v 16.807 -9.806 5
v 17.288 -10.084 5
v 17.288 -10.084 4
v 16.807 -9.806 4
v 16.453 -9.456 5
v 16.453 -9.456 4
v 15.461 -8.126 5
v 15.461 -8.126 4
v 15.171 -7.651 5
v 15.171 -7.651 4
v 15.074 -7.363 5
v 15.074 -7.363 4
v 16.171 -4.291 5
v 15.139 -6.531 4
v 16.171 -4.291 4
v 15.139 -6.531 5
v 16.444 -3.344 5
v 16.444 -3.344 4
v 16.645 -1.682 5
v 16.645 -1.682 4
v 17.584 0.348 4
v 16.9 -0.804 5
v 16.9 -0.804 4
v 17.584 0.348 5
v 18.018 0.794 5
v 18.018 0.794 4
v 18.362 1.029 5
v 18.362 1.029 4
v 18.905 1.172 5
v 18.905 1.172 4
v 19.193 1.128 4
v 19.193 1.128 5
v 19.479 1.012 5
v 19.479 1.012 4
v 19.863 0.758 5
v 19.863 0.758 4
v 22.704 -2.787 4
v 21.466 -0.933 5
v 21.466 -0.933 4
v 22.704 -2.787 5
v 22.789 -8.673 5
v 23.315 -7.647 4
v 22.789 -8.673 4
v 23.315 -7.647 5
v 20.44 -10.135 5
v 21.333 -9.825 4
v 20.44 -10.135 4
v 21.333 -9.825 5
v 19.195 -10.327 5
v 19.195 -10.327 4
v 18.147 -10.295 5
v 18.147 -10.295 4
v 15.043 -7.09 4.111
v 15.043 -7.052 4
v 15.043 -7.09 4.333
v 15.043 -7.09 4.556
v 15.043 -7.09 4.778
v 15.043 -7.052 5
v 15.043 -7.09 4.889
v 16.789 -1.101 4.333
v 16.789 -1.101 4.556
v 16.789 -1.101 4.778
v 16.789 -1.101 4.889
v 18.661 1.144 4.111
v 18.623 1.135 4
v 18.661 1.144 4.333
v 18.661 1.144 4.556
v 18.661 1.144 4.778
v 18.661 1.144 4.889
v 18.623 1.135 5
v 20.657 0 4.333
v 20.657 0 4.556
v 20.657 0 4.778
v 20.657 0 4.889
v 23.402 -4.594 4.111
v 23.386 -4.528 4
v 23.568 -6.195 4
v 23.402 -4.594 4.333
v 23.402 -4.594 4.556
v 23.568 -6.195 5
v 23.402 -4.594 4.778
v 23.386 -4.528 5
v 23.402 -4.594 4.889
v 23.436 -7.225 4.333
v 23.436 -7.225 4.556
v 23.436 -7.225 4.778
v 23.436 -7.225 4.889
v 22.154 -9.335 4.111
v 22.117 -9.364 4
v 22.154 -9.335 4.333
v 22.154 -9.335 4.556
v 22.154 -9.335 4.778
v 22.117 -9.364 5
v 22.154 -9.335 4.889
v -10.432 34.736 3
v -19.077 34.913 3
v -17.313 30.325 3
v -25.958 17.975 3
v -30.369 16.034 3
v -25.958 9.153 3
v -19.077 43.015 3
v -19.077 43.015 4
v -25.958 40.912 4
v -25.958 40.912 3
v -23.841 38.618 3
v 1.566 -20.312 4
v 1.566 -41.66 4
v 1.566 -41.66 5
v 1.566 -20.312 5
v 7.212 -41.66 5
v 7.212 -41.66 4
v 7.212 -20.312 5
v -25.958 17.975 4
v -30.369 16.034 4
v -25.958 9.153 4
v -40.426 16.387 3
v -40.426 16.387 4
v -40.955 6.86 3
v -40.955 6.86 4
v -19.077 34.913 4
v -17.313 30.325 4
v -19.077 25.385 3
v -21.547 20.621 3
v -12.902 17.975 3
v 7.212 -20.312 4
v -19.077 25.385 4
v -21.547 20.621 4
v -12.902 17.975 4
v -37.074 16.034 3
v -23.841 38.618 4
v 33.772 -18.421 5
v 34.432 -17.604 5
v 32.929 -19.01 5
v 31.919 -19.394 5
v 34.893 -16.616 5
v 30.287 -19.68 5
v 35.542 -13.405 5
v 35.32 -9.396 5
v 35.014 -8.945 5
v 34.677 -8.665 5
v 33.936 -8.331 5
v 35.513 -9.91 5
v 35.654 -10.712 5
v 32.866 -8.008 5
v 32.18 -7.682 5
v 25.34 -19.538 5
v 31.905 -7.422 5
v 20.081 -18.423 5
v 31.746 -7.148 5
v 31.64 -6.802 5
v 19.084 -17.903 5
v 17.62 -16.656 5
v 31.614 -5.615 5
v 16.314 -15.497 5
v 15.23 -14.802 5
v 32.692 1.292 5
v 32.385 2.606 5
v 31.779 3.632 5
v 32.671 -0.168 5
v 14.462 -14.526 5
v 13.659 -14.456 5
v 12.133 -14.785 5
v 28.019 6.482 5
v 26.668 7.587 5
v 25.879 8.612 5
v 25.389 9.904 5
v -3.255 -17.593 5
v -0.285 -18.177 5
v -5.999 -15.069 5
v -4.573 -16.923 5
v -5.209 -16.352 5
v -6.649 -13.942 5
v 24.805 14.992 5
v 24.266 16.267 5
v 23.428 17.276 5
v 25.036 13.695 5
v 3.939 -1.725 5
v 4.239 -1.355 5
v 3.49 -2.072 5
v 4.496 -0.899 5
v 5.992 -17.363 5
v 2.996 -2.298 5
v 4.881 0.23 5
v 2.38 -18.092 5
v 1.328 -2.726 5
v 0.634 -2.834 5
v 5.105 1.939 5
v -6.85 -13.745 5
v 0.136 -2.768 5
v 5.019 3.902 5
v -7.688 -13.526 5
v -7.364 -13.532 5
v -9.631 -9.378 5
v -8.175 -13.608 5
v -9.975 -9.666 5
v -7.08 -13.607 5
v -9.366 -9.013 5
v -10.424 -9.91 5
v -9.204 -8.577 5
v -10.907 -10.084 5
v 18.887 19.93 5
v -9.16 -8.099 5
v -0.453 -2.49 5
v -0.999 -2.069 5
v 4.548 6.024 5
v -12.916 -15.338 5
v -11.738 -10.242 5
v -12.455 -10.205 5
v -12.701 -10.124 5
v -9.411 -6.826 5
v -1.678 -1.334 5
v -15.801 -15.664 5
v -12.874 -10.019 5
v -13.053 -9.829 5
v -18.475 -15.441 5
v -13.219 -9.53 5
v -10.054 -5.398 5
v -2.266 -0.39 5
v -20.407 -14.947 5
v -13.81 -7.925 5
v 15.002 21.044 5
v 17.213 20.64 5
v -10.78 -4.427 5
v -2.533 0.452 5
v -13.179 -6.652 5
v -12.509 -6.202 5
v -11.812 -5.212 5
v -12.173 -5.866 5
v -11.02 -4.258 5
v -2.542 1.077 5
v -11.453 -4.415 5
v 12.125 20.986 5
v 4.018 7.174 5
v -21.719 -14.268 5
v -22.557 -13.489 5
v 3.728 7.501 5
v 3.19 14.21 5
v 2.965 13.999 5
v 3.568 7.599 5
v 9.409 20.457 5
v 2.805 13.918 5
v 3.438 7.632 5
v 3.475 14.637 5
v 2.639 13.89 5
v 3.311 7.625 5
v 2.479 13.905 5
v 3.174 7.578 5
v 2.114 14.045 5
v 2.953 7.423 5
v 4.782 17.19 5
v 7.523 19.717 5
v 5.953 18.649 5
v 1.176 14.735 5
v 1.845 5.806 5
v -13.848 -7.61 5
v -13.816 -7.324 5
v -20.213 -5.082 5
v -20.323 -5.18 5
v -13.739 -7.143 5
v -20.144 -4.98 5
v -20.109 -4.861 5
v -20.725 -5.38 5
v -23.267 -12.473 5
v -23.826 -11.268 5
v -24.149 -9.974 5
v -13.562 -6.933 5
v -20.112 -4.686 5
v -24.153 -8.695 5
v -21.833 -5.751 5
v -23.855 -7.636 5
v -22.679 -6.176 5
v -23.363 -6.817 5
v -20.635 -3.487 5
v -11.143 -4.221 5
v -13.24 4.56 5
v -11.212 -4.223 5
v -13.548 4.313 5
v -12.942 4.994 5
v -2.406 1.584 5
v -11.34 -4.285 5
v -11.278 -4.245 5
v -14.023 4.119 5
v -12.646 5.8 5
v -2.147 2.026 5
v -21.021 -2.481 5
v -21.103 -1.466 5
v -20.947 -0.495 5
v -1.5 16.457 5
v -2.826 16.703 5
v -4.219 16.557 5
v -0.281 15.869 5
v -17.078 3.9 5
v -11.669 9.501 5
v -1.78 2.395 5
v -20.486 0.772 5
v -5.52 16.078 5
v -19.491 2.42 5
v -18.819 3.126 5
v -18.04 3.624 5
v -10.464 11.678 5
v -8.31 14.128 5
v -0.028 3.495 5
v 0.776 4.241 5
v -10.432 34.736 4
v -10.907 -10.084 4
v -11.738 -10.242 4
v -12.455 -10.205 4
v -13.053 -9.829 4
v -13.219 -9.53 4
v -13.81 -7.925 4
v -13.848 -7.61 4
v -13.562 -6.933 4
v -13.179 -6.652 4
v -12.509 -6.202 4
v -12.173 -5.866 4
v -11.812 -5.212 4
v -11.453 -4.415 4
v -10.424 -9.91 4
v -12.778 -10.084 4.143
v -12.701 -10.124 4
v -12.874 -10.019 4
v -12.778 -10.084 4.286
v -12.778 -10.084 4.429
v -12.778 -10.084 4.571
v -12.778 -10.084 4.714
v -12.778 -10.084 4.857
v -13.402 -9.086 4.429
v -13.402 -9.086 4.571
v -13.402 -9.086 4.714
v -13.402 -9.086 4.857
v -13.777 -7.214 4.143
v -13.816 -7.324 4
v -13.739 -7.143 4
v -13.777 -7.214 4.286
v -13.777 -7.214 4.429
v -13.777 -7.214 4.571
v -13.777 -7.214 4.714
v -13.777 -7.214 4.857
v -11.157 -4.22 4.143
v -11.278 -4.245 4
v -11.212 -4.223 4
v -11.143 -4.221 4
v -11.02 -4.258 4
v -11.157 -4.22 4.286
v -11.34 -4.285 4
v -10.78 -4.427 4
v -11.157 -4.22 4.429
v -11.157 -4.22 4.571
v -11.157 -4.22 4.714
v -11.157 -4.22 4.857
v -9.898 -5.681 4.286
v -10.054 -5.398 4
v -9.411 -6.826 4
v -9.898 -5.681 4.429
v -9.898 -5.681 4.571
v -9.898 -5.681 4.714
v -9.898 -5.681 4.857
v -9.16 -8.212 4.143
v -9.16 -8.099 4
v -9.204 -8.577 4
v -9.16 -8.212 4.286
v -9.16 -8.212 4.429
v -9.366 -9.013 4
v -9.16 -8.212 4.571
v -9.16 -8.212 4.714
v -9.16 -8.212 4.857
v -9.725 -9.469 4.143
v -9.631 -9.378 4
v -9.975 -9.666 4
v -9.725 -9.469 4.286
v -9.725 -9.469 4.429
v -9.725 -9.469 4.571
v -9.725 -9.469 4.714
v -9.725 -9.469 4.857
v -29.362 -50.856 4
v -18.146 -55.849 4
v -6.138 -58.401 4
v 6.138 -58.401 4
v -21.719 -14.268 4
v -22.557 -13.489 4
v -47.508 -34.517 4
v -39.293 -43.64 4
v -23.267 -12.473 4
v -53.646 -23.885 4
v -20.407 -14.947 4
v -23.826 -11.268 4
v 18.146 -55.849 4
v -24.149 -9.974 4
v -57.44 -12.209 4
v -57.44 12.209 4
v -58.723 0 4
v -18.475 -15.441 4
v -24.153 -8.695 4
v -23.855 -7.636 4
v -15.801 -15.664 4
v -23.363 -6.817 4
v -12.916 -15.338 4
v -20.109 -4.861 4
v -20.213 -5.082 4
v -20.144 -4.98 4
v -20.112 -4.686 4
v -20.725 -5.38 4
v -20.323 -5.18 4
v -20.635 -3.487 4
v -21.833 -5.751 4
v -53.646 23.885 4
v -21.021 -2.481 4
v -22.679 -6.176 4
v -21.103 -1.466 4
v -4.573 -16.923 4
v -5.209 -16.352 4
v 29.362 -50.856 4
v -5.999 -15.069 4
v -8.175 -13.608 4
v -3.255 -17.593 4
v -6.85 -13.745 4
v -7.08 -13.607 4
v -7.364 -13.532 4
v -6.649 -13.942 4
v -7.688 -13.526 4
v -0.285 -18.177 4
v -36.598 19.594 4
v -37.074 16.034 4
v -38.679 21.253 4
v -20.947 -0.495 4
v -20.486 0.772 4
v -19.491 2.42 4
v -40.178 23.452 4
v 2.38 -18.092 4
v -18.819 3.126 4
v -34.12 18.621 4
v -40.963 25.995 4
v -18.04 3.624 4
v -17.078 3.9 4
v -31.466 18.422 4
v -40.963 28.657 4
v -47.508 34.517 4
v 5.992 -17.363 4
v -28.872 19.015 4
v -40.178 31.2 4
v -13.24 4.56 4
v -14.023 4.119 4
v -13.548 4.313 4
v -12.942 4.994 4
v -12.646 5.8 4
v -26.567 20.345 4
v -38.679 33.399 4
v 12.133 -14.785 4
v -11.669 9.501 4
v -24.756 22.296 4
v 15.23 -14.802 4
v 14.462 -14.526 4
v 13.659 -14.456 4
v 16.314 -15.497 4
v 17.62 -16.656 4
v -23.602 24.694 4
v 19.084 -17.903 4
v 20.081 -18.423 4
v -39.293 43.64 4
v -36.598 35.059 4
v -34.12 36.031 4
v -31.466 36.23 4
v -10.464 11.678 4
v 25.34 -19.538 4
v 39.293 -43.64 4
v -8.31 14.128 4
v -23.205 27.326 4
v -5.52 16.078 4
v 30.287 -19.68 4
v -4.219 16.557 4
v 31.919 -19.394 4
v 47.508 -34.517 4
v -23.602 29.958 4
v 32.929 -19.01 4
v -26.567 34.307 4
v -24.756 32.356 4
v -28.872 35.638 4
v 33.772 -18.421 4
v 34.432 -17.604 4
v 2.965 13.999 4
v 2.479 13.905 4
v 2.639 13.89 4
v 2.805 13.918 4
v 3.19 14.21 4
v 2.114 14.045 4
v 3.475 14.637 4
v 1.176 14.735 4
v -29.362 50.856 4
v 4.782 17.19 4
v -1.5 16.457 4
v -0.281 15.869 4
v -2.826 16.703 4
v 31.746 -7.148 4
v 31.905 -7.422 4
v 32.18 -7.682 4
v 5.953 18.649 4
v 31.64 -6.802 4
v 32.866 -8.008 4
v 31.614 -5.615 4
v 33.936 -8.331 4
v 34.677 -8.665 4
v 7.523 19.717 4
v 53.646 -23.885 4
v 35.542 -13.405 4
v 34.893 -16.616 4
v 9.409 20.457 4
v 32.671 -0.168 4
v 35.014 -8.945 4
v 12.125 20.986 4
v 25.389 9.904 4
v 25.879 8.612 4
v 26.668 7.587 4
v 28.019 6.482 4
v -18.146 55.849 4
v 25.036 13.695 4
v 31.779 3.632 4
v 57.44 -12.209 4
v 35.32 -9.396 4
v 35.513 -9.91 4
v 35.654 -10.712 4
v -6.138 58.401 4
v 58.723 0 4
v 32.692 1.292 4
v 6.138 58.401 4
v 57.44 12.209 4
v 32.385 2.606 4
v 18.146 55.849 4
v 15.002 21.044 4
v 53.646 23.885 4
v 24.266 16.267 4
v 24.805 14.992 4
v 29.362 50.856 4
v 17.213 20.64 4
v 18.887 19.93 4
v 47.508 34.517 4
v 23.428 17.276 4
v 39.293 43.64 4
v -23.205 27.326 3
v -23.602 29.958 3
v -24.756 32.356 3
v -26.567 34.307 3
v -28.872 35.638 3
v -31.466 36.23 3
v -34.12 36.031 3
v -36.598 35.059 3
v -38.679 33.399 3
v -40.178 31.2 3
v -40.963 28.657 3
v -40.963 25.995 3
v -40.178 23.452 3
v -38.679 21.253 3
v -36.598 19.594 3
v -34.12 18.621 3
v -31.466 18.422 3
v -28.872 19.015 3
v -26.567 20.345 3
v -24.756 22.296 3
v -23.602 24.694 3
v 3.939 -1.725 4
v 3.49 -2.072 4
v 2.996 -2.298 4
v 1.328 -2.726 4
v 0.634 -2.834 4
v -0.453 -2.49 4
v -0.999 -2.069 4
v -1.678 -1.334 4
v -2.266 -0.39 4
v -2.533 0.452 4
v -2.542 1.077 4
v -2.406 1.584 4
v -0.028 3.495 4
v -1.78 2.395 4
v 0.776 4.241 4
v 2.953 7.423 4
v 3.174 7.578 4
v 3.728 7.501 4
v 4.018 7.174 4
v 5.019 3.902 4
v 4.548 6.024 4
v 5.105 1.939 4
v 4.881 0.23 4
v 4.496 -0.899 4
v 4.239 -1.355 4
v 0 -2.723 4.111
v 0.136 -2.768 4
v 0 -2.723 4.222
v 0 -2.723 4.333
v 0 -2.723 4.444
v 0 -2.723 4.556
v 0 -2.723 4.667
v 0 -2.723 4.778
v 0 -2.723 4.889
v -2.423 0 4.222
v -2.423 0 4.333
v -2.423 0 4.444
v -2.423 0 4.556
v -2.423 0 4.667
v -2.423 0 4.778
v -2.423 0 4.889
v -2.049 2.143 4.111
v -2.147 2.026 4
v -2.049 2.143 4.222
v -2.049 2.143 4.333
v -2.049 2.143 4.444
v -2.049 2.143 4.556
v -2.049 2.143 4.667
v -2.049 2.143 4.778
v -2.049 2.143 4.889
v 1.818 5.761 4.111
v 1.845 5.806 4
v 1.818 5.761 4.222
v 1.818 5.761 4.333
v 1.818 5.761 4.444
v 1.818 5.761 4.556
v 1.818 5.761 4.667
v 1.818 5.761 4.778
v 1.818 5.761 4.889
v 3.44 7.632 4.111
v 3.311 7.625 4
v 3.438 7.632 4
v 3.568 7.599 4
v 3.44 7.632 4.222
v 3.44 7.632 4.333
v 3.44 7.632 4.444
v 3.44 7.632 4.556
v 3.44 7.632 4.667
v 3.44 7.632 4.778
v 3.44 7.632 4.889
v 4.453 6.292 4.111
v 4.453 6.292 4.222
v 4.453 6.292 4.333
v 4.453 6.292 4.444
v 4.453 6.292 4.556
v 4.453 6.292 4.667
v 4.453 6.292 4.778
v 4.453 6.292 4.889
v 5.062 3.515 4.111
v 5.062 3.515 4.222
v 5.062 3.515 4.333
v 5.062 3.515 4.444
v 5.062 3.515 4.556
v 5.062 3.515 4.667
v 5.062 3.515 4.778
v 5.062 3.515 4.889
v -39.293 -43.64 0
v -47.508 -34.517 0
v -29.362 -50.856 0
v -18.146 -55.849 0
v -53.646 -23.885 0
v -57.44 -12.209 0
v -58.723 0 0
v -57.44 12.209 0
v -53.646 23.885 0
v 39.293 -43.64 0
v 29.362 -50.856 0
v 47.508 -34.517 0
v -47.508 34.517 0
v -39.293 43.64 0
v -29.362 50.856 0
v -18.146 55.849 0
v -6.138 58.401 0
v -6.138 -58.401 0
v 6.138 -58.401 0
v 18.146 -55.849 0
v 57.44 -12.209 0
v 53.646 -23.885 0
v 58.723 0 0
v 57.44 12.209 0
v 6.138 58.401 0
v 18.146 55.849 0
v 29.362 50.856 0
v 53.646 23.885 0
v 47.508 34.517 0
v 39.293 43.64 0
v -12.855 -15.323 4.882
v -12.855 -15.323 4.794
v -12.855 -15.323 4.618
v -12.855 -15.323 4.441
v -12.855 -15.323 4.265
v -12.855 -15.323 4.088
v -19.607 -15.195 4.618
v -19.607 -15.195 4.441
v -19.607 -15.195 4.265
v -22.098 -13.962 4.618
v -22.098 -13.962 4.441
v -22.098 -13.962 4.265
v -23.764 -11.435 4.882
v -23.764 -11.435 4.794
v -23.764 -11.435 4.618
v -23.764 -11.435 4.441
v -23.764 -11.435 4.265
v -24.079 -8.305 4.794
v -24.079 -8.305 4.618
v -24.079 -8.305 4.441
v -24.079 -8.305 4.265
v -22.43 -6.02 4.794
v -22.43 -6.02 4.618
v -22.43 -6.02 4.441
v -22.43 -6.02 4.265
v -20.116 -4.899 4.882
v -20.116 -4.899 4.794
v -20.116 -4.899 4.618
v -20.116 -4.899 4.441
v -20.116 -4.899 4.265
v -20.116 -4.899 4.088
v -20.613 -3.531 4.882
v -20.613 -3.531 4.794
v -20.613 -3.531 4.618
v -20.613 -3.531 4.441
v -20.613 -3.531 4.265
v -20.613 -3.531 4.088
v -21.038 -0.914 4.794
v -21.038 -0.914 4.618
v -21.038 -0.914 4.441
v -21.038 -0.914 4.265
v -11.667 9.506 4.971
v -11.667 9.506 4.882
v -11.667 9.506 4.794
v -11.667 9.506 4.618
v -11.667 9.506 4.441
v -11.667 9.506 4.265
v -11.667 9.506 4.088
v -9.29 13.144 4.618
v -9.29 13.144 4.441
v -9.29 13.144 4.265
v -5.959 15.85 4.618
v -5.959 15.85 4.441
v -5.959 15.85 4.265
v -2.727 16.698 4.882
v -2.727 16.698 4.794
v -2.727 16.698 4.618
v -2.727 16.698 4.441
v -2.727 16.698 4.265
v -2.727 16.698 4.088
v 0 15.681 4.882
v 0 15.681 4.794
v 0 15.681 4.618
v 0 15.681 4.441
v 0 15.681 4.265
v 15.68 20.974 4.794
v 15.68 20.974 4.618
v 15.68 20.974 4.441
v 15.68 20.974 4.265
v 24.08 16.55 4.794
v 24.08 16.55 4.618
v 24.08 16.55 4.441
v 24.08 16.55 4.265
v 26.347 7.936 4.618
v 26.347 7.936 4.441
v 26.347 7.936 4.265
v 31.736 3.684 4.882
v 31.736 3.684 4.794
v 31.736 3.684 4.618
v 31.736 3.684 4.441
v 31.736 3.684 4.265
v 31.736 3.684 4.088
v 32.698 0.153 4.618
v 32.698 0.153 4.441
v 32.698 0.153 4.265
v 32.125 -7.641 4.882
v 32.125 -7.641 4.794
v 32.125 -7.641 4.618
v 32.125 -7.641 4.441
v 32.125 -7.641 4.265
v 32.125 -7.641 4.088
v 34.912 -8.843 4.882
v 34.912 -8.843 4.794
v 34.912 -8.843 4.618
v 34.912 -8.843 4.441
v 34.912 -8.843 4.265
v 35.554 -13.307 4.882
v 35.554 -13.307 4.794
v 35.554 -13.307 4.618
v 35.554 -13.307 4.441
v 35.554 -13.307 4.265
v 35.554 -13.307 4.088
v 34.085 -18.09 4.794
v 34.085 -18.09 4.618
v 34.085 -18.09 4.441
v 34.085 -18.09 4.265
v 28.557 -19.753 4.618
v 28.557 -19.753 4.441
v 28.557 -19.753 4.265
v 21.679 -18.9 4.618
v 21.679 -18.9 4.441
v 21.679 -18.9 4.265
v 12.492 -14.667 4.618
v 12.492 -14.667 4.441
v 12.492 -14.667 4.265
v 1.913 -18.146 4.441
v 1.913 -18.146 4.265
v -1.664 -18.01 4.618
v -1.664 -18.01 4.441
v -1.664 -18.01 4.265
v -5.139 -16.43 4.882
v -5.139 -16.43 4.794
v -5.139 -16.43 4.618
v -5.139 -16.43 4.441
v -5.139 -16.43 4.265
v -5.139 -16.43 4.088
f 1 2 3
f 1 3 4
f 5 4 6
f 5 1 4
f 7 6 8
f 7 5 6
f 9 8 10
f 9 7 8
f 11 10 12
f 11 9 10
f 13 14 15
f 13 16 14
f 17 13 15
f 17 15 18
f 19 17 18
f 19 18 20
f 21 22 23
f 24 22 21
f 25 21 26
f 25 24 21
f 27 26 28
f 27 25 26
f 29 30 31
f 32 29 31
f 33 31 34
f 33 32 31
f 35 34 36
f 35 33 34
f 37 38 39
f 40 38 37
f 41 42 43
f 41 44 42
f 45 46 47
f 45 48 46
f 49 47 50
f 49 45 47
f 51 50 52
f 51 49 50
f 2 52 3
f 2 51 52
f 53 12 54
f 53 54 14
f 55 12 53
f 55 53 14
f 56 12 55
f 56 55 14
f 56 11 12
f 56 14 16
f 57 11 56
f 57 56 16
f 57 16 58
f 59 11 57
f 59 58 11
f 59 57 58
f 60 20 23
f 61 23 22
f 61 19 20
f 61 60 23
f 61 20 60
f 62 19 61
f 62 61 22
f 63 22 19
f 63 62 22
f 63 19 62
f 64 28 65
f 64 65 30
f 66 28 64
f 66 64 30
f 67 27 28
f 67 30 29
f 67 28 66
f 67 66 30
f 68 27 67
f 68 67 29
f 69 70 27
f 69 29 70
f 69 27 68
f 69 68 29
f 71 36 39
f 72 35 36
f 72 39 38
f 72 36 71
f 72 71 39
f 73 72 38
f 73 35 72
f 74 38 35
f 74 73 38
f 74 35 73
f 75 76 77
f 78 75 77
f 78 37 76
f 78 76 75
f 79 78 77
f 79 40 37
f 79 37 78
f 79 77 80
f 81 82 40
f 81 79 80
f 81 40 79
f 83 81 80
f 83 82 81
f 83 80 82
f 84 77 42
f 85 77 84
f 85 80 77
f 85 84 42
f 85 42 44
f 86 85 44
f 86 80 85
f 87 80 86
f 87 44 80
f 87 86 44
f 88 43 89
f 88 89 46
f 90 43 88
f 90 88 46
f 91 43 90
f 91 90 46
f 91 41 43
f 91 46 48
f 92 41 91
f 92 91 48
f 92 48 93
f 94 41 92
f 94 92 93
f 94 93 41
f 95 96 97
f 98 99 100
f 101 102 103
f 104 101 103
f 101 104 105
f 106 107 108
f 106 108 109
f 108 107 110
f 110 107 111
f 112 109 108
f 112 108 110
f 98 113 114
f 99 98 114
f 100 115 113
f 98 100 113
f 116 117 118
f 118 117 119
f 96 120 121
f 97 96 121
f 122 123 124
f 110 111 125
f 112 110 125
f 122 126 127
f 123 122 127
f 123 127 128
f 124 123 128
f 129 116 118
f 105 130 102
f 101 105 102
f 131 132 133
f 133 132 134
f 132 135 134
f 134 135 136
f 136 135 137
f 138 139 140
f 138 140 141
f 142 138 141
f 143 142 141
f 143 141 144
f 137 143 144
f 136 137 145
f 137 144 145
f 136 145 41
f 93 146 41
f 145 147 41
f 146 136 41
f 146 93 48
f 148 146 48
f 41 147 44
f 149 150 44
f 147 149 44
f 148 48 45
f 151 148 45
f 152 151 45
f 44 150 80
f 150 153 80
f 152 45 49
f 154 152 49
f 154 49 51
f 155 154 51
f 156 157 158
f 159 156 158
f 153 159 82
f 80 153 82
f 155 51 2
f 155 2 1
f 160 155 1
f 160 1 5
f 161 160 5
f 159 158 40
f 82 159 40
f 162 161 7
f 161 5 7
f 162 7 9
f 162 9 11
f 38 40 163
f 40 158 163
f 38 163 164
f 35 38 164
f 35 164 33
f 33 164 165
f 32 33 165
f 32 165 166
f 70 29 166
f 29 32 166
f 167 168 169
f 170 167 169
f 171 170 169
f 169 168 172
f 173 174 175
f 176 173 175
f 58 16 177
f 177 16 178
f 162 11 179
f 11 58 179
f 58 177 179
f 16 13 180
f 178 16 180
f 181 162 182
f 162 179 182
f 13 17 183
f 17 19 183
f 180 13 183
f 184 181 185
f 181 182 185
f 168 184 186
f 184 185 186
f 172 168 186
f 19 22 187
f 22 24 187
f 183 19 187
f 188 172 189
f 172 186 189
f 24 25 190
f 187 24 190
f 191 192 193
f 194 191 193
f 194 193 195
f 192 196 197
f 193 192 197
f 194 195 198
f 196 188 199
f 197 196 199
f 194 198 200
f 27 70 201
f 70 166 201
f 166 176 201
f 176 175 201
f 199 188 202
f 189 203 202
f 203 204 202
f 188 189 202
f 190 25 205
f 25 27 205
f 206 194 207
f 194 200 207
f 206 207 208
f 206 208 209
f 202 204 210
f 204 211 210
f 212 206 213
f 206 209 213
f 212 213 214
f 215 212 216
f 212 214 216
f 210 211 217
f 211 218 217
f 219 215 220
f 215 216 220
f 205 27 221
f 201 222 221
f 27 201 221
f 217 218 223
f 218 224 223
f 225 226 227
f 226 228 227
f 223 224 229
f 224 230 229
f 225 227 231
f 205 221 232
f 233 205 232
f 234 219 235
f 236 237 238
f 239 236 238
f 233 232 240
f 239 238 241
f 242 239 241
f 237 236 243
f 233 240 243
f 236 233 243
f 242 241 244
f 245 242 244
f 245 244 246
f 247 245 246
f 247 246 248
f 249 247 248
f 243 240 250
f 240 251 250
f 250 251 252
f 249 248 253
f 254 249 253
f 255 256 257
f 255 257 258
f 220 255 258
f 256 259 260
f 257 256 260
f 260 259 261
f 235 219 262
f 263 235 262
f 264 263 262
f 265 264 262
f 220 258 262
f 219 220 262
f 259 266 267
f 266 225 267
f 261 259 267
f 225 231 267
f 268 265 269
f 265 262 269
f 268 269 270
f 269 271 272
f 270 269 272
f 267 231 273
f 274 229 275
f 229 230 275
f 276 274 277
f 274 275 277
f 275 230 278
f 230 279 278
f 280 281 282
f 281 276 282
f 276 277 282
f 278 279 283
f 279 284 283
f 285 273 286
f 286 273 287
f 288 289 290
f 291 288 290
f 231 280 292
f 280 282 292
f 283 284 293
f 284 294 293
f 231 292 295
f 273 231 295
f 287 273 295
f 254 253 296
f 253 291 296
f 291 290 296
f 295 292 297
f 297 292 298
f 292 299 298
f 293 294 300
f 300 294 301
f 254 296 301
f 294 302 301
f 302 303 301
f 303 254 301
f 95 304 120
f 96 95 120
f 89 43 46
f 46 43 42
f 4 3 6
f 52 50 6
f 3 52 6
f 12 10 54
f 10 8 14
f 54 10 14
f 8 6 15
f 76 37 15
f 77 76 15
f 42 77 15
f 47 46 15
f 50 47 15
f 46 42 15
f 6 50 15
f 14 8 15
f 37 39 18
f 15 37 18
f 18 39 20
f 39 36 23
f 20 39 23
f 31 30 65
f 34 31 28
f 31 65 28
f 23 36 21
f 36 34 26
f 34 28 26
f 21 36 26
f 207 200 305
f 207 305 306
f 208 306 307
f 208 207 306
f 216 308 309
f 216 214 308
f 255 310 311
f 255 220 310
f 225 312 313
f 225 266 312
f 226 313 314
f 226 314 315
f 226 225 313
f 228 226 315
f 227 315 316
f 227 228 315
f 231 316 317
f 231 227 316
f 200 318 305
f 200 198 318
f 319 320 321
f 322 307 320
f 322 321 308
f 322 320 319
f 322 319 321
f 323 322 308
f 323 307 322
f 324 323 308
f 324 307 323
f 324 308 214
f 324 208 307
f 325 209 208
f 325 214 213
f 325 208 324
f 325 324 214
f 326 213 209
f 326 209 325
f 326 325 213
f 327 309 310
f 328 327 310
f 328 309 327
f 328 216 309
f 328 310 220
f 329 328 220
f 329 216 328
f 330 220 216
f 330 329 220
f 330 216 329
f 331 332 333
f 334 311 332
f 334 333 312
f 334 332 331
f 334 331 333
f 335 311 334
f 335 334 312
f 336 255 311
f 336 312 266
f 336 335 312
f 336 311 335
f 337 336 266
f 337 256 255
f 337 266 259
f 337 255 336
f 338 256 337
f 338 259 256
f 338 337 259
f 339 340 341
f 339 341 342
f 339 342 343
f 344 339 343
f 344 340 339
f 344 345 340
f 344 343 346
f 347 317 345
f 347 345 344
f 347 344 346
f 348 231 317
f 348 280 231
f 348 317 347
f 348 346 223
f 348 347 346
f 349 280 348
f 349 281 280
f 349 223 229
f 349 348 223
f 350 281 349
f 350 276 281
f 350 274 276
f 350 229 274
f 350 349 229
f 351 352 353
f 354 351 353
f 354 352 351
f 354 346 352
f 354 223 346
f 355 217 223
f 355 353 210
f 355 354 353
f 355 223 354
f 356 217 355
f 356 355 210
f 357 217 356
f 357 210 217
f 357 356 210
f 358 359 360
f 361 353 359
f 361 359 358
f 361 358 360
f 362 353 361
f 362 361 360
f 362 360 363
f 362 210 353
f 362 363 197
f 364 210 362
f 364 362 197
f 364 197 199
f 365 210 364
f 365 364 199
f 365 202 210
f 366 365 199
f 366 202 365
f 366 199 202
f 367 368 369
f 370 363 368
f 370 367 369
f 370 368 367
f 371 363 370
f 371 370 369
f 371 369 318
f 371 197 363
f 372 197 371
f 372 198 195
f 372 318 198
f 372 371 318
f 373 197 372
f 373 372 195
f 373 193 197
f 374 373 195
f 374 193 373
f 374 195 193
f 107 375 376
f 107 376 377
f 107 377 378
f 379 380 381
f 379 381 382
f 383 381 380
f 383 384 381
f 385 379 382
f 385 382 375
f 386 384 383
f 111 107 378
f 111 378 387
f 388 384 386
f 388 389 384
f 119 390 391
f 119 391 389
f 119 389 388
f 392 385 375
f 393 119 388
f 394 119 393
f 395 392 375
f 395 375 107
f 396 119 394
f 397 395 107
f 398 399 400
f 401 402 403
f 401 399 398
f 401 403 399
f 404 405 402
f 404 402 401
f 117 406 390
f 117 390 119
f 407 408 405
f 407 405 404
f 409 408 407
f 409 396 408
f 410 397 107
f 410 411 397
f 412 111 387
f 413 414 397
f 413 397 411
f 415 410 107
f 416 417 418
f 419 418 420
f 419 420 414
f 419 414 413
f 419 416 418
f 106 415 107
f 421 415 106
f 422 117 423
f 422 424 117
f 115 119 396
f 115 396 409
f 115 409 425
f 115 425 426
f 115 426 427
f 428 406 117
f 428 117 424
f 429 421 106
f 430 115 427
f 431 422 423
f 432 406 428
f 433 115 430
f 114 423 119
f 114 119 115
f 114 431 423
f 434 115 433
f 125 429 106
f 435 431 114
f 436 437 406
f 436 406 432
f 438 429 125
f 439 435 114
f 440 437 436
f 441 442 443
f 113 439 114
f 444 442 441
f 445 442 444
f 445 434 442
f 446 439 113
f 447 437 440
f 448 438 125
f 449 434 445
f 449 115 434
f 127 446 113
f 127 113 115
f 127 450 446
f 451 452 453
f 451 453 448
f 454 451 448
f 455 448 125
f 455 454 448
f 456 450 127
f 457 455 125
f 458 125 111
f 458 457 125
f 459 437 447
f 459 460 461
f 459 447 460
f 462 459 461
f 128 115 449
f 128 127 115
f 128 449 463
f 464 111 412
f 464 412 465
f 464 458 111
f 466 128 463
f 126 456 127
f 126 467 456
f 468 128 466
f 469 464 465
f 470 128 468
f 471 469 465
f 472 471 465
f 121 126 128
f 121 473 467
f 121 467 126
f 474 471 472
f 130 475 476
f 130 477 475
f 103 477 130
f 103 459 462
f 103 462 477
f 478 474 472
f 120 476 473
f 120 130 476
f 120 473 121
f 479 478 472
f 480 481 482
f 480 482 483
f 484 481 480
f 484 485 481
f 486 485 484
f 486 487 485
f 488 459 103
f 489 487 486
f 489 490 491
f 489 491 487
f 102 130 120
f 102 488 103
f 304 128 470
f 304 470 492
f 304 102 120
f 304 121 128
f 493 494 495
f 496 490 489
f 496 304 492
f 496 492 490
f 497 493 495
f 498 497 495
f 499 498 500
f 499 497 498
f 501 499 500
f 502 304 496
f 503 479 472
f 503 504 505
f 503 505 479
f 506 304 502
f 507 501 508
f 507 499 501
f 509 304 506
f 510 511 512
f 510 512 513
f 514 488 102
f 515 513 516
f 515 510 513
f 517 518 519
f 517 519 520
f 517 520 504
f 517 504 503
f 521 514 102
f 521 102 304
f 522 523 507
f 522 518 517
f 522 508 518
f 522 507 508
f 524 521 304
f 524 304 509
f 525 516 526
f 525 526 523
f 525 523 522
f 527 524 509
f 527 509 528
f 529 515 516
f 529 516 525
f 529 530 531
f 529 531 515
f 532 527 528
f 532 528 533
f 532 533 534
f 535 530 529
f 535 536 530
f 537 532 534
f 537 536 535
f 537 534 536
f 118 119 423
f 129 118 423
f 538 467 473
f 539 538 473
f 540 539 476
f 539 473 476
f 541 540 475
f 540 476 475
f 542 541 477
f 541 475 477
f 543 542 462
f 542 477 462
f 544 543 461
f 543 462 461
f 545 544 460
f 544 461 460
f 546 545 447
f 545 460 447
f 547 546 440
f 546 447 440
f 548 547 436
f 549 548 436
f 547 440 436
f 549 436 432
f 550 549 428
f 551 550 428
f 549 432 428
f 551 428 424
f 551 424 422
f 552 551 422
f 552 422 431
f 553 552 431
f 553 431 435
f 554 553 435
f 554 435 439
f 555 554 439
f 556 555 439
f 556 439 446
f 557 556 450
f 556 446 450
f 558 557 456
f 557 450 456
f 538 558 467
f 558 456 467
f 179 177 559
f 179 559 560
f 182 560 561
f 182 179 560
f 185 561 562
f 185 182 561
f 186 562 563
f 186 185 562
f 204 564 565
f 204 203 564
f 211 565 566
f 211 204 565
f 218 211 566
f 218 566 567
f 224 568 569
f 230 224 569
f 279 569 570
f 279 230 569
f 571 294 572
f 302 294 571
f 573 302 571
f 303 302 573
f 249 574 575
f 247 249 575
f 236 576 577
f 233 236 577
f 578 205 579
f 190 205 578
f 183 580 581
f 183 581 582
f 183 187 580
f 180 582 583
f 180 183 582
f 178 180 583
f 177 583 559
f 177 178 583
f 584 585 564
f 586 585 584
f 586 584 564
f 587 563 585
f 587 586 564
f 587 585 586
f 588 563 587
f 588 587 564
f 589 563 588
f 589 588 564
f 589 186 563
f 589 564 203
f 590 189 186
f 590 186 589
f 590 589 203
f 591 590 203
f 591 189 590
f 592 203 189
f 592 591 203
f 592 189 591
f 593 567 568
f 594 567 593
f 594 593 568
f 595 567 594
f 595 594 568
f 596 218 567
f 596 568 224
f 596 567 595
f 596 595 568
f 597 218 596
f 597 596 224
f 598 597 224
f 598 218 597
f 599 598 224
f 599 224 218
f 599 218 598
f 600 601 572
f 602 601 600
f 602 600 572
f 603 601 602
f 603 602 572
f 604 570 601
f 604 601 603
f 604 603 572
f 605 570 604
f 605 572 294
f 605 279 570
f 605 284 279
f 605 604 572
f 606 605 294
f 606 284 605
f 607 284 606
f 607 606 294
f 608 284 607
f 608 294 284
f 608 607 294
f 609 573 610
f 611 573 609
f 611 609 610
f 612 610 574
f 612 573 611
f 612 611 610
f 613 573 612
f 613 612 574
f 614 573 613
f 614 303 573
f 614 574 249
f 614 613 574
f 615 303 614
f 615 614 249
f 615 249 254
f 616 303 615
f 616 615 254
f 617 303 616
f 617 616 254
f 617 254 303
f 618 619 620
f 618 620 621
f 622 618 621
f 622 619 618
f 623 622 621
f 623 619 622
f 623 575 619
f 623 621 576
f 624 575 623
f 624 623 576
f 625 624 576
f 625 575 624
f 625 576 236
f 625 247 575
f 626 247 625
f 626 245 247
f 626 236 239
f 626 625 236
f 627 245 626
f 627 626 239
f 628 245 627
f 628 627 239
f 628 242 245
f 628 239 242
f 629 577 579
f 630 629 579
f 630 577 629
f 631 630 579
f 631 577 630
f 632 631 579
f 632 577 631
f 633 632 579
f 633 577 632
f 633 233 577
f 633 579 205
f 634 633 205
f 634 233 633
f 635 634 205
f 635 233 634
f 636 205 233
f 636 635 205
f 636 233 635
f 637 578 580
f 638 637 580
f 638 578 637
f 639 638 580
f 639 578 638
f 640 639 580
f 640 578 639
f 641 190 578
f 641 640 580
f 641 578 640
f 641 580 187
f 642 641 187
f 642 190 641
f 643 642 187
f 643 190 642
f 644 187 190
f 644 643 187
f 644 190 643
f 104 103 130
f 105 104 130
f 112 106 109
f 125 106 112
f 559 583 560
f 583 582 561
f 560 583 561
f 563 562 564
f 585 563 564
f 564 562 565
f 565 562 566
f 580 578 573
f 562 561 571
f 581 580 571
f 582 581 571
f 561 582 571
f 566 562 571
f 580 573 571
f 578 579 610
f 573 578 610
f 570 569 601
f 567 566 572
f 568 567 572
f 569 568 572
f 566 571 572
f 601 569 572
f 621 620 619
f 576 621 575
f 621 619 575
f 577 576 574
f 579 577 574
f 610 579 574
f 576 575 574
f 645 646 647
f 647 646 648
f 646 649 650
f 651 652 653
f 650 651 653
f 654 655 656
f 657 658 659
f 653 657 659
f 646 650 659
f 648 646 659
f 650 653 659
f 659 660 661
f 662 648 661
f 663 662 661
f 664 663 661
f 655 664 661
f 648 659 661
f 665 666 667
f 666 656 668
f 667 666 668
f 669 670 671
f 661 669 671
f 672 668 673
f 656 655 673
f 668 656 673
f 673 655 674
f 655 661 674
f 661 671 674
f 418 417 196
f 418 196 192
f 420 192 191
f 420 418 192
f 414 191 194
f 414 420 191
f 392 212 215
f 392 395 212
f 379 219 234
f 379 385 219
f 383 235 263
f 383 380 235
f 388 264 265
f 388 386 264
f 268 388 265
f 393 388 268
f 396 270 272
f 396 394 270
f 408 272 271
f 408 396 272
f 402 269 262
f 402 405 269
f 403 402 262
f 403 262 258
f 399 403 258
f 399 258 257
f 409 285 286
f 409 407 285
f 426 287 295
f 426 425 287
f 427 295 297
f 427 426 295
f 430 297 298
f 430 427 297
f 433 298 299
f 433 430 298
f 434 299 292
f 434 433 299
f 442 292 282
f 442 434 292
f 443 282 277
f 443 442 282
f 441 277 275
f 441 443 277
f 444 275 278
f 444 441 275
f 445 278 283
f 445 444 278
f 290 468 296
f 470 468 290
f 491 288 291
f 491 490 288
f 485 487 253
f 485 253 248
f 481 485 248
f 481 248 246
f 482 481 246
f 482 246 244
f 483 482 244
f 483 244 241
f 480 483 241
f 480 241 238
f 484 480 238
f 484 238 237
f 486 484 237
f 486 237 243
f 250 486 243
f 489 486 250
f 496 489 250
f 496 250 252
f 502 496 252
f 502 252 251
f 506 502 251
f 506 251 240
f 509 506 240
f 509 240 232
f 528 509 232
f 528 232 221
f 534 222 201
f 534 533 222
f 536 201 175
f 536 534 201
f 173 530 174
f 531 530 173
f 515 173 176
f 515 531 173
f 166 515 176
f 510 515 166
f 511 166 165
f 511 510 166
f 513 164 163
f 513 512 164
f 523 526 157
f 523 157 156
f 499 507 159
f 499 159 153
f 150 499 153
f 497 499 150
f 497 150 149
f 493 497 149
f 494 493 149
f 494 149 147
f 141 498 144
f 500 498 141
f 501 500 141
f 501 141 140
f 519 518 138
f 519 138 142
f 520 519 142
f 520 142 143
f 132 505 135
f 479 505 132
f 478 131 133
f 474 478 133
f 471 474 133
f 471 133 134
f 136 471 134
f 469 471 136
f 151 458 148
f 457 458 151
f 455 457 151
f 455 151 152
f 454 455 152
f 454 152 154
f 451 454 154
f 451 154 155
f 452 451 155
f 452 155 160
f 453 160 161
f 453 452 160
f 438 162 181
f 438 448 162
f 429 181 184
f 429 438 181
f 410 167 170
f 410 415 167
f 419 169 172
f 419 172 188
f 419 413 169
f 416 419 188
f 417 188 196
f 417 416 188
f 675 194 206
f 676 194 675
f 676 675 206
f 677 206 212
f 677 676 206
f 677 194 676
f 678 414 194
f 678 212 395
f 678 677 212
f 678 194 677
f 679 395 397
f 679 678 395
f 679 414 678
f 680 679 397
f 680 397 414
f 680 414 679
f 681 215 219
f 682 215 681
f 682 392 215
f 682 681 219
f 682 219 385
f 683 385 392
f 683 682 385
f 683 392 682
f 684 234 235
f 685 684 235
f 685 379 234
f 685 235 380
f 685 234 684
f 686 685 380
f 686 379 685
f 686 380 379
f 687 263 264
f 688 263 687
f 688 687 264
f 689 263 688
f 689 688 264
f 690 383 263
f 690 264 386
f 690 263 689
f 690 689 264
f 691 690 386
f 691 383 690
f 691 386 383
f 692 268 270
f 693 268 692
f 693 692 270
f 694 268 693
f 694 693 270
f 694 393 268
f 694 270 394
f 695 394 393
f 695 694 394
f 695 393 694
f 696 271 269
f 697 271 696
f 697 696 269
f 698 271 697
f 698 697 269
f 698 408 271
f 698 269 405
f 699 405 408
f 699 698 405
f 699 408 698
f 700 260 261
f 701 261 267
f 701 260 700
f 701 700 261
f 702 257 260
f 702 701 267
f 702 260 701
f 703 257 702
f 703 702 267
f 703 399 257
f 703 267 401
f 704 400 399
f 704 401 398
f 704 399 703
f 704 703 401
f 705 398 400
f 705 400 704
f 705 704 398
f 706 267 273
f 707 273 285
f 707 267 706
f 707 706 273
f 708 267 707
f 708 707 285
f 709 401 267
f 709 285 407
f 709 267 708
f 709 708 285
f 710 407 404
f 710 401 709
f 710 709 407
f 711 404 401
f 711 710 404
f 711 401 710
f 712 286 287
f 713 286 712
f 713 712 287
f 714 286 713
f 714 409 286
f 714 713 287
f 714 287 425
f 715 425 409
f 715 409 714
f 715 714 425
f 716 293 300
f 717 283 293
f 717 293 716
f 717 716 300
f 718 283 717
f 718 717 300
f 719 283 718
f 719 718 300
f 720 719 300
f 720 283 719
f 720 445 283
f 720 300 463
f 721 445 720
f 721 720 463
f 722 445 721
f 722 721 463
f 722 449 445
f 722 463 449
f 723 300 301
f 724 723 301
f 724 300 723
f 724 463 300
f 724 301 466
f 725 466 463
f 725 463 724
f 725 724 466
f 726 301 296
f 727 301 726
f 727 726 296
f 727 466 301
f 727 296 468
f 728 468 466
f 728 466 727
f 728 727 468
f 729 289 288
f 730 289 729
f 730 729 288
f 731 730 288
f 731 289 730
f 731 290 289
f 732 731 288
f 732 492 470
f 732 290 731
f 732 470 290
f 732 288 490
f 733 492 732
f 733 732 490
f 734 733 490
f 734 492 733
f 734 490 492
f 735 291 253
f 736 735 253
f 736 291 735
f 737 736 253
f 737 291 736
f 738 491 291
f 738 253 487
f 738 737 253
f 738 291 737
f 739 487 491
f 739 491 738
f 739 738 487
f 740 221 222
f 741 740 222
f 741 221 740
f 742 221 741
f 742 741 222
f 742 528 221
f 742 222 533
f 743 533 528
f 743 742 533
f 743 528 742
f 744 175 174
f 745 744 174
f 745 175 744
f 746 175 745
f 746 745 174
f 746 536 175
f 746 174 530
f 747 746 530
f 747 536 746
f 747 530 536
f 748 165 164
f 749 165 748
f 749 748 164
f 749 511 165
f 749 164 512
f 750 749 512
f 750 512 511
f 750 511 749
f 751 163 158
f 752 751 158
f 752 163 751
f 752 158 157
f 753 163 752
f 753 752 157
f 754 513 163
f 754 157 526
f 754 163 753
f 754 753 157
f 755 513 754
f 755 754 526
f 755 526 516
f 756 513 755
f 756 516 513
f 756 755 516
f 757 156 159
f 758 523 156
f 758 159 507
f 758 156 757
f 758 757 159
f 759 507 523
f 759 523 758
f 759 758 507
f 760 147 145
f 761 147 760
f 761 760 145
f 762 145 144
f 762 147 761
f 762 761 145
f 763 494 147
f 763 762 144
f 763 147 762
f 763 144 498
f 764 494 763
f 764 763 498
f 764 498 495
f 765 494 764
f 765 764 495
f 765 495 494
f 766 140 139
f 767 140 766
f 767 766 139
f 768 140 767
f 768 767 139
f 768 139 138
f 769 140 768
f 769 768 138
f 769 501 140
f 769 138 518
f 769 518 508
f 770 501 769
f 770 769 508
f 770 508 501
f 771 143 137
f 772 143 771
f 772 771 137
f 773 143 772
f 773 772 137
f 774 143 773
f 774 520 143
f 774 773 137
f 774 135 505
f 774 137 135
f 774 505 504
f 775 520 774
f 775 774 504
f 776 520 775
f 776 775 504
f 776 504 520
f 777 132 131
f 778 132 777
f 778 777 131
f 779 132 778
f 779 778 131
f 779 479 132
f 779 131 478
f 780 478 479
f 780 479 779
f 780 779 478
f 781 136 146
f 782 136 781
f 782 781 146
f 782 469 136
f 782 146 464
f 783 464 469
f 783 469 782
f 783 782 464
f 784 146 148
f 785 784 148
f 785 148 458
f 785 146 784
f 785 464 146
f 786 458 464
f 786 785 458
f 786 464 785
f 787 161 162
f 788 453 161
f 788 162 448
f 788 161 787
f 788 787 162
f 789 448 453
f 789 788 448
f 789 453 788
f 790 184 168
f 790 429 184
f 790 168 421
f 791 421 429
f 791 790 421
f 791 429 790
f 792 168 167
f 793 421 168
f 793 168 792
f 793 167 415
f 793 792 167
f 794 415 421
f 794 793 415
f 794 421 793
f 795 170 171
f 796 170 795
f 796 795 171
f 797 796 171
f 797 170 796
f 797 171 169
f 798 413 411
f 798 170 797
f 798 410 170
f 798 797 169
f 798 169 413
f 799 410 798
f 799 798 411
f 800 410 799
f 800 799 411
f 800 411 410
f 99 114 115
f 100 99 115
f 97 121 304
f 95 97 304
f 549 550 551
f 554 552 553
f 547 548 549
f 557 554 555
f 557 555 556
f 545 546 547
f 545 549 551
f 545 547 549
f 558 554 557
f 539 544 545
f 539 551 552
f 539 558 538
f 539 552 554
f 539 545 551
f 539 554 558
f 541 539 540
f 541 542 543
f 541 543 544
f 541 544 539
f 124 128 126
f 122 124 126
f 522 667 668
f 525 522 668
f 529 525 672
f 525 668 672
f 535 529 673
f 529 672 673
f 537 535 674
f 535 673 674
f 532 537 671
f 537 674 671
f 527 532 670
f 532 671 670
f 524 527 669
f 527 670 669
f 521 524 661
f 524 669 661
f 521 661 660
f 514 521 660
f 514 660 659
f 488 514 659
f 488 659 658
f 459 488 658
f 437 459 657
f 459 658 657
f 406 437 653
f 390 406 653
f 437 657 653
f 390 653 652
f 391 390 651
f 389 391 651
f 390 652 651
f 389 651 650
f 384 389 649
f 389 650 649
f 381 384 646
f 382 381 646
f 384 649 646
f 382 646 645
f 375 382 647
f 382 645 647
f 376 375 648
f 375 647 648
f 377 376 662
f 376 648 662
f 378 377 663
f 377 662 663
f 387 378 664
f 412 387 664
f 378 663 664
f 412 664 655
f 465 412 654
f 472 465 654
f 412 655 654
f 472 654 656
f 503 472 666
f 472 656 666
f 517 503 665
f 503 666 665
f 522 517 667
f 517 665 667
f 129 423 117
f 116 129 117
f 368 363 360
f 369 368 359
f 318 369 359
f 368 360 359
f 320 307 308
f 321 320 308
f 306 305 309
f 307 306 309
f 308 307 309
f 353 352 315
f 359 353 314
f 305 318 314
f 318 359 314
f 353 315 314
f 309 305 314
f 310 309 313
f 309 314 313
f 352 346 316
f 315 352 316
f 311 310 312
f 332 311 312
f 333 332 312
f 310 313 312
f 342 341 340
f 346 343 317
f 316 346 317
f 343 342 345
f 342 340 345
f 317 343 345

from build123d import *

# Parameters (mm, degrees)
F0_R      = 58.7230899661
F1_DEPTH  = 4
F3_DEPTH  = 1
F4_W      = 5.6459326297
F4_H      = 21.3486850262
F5_DEPTH  = 1
F6_R      = 8.9287488316
F7_DEPTH  = 1
F9_DEPTH  = 1
F11_DEPTH = 1


with BuildPart() as f1:
    # F0 (on Top) → F1 (new body)
    with BuildSketch(Plane.XY):
        Circle(F0_R)
    extrude(amount=F1_DEPTH)

    # F2 (on face) → F3 (join)
    with BuildSketch(Plane.XY.offset(4)):
        with BuildLine():
            add(Edge.make_bspline(
                [(-7.0797624066, -13.6069757864), (-8.1237919042, -13.1612297991), (-12.4752413526, -16.1381829323), (-19.6344842789, -15.5358231757), (-22.8496611219, -13.821082529), (-24.8899871678, -9.2114665666), (-22.9632243504, -5.6045975053), (-19.1184211627, -5.3683674503), (-21.8317476219, -2.3769989433), (-20.1770255267, 1.9384633445), (-17.6516591472, 4.4660249411), (-12.2692246409, 3.3069707491), (-12.7711128773, 10.2065758547), (-5.2070478337, 17.5909120343), (-0.0535496765, 16.3213421034), (3.3709105709, 12.1659008994), (4.6556481422, 20.3930406124), (15.9899725805, 21.7172343382), (19.6592766333, 19.4132671881), (24.0396358538, 17.4252401027), (25.3908757582, 13.7657414676), (24.7223620434, 7.4169241227), (32.9476623006, 4.359217623), (32.8386327421, -1.3561803472), (30.4316173049, -8.3435581045), (36.0945698344, -7.9760349957), (35.5488389604, -14.4025464856), (34.0823663613, -20.877809937), (21.3193272574, -19.1339705391), (18.4154467603, -17.7347424376), (14.353460754, -12.9752717979), (8.6718725682, -16.8182142149), (3.8642270119, -17.880205375), (0.150281386, -18.4806208225), (-5.7807431955, -17.3198898619), (-6.2577452786, -13.9579341043), (-7.0797624066, -13.6069757864)],
                knots=[0, 0, 0, 0, 0.0310282295, 0.0665284999, 0.0911507077, 0.1192199767, 0.1443782645, 0.1653569413, 0.1867334989, 0.2143092637, 0.2386087119, 0.2647334159, 0.2954403945, 0.336615007, 0.3656467604, 0.3896607393, 0.4205616681, 0.4626843472, 0.4907536128, 0.5183068163, 0.5434799289, 0.5746339055, 0.610234063, 0.6407350275, 0.6726496948, 0.6966813331, 0.7271238591, 0.7583711602, 0.8023797338, 0.8278008876, 0.8571474467, 0.8893982882, 0.9188193224, 0.9448030461, 0.9755699085, 1, 1, 1, 1], degree=3))
        make_face()
    extrude(amount=F3_DEPTH)

    # F4 (on face) → F5 (join)
    with BuildSketch(Plane.XY.offset(4)):
        with Locations((4.3885414489, -30.985865742)):
            Rectangle(F4_W, F4_H)
    extrude(amount=F5_DEPTH)

    # F6 (on face) → F7 (cut)
    with BuildSketch(Plane.XY.offset(4)):
        with Locations((-32.1335941553, 27.3260436952)):
            Circle(F6_R)
    extrude(amount=-F7_DEPTH, mode=Mode.SUBTRACT)

    # F8 (on face) → F9 (cut)
    with BuildSketch(Plane.XY.offset(4)):
        Polygon((-19.0773736686, 43.0152244403), (-25.9583536536, 40.9115739167), (-23.8411277533, 38.6179126799), align=None)
        Polygon((-10.4320347309, 34.7363315523), (-19.0773736686, 34.9127687514), (-17.3130165786, 30.3254462779), align=None)
        Polygon((-19.0773736686, 25.385254994), (-21.5474683791, 20.621497184), (-12.9021322355, 17.974967137), align=None)
        Polygon((-25.9583536536, 17.974967137), (-30.369238928, 16.0341765732), (-25.9583536536, 9.1531947255), align=None)
        Polygon((-37.0737873018, 16.0341765732), (-40.4260605574, 16.3870472461), (-40.9553647041, 6.8595339544), align=None)
    extrude(amount=-F9_DEPTH, mode=Mode.SUBTRACT)

    # F10 (on face) → F11 (cut)
    with BuildSketch(Plane.XY.offset(5)):
        with BuildLine():
            add(Edge.make_bspline(
                [(3.9392304607, -1.725016511), (3.3389278599, -2.3311137593), (1.7960793796, -2.5098405038), (-0.1143999822, -3.2740740829), (-2.9351981666, -0.1253071656), (-2.3429019607, 2.4171730428), (0.251688615, 3.3535211095), (1.7382669289, 5.5096435842), (3.6402437679, 9.0890322129), (5.6475828773, 3.2511384682), (4.8568020297, -0.7985877359), (3.9392304607, -1.725016511)],
                knots=[0, 0, 0, 0, 0.0976394236, 0.1846769946, 0.3077685936, 0.4028476644, 0.5040944042, 0.6136849067, 0.715139099, 0.85075667, 1, 1, 1, 1], degree=3))
        make_face()
        with BuildLine():
            add(Edge.make_bspline(
                [(-10.9070558101, -10.0838495418), (-11.6399469387, -10.2977150749), (-12.9554178997, -10.3349526533), (-13.3592529485, -9.1095793979), (-14.3827449096, -6.8805289805), (-11.80284879, -6.3079164171), (-11.4154720518, -2.6255947939), (-8.0632612505, -8.6403755559), (-10.0498906647, -9.8337195108), (-10.9070558101, -10.0838495418)],
                knots=[0, 0, 0, 0, 0.1317325817, 0.2362034259, 0.369234049, 0.5095952384, 0.6424834886, 0.8459299436, 1, 1, 1, 1], degree=3))
        make_face()
        with BuildLine():
            add(Edge.make_bspline(
                [(17.2884091735, -10.0838495418), (16.5584759392, -9.7844349271), (16.0504329988, -8.690712767), (14.3741960954, -7.0959018407), (16.7776115076, -3.9354963721), (16.3164645284, -1.1926472216), (18.6180305915, 1.9235923572), (20.9137585384, -0.0864269955), (24.1550892799, -4.3176495993), (23.1685197368, -10.2232669426), (18.4509318078, -10.560709959), (17.2884091735, -10.0838495418)],
                knots=[0, 0, 0, 0, 0.0856639557, 0.1691201078, 0.2818213634, 0.3867619231, 0.4918944954, 0.5851685755, 0.7274215706, 0.86356795, 1, 1, 1, 1], degree=3))
        make_face()
    extrude(amount=-F11_DEPTH, mode=Mode.SUBTRACT)


solid = f1.part
